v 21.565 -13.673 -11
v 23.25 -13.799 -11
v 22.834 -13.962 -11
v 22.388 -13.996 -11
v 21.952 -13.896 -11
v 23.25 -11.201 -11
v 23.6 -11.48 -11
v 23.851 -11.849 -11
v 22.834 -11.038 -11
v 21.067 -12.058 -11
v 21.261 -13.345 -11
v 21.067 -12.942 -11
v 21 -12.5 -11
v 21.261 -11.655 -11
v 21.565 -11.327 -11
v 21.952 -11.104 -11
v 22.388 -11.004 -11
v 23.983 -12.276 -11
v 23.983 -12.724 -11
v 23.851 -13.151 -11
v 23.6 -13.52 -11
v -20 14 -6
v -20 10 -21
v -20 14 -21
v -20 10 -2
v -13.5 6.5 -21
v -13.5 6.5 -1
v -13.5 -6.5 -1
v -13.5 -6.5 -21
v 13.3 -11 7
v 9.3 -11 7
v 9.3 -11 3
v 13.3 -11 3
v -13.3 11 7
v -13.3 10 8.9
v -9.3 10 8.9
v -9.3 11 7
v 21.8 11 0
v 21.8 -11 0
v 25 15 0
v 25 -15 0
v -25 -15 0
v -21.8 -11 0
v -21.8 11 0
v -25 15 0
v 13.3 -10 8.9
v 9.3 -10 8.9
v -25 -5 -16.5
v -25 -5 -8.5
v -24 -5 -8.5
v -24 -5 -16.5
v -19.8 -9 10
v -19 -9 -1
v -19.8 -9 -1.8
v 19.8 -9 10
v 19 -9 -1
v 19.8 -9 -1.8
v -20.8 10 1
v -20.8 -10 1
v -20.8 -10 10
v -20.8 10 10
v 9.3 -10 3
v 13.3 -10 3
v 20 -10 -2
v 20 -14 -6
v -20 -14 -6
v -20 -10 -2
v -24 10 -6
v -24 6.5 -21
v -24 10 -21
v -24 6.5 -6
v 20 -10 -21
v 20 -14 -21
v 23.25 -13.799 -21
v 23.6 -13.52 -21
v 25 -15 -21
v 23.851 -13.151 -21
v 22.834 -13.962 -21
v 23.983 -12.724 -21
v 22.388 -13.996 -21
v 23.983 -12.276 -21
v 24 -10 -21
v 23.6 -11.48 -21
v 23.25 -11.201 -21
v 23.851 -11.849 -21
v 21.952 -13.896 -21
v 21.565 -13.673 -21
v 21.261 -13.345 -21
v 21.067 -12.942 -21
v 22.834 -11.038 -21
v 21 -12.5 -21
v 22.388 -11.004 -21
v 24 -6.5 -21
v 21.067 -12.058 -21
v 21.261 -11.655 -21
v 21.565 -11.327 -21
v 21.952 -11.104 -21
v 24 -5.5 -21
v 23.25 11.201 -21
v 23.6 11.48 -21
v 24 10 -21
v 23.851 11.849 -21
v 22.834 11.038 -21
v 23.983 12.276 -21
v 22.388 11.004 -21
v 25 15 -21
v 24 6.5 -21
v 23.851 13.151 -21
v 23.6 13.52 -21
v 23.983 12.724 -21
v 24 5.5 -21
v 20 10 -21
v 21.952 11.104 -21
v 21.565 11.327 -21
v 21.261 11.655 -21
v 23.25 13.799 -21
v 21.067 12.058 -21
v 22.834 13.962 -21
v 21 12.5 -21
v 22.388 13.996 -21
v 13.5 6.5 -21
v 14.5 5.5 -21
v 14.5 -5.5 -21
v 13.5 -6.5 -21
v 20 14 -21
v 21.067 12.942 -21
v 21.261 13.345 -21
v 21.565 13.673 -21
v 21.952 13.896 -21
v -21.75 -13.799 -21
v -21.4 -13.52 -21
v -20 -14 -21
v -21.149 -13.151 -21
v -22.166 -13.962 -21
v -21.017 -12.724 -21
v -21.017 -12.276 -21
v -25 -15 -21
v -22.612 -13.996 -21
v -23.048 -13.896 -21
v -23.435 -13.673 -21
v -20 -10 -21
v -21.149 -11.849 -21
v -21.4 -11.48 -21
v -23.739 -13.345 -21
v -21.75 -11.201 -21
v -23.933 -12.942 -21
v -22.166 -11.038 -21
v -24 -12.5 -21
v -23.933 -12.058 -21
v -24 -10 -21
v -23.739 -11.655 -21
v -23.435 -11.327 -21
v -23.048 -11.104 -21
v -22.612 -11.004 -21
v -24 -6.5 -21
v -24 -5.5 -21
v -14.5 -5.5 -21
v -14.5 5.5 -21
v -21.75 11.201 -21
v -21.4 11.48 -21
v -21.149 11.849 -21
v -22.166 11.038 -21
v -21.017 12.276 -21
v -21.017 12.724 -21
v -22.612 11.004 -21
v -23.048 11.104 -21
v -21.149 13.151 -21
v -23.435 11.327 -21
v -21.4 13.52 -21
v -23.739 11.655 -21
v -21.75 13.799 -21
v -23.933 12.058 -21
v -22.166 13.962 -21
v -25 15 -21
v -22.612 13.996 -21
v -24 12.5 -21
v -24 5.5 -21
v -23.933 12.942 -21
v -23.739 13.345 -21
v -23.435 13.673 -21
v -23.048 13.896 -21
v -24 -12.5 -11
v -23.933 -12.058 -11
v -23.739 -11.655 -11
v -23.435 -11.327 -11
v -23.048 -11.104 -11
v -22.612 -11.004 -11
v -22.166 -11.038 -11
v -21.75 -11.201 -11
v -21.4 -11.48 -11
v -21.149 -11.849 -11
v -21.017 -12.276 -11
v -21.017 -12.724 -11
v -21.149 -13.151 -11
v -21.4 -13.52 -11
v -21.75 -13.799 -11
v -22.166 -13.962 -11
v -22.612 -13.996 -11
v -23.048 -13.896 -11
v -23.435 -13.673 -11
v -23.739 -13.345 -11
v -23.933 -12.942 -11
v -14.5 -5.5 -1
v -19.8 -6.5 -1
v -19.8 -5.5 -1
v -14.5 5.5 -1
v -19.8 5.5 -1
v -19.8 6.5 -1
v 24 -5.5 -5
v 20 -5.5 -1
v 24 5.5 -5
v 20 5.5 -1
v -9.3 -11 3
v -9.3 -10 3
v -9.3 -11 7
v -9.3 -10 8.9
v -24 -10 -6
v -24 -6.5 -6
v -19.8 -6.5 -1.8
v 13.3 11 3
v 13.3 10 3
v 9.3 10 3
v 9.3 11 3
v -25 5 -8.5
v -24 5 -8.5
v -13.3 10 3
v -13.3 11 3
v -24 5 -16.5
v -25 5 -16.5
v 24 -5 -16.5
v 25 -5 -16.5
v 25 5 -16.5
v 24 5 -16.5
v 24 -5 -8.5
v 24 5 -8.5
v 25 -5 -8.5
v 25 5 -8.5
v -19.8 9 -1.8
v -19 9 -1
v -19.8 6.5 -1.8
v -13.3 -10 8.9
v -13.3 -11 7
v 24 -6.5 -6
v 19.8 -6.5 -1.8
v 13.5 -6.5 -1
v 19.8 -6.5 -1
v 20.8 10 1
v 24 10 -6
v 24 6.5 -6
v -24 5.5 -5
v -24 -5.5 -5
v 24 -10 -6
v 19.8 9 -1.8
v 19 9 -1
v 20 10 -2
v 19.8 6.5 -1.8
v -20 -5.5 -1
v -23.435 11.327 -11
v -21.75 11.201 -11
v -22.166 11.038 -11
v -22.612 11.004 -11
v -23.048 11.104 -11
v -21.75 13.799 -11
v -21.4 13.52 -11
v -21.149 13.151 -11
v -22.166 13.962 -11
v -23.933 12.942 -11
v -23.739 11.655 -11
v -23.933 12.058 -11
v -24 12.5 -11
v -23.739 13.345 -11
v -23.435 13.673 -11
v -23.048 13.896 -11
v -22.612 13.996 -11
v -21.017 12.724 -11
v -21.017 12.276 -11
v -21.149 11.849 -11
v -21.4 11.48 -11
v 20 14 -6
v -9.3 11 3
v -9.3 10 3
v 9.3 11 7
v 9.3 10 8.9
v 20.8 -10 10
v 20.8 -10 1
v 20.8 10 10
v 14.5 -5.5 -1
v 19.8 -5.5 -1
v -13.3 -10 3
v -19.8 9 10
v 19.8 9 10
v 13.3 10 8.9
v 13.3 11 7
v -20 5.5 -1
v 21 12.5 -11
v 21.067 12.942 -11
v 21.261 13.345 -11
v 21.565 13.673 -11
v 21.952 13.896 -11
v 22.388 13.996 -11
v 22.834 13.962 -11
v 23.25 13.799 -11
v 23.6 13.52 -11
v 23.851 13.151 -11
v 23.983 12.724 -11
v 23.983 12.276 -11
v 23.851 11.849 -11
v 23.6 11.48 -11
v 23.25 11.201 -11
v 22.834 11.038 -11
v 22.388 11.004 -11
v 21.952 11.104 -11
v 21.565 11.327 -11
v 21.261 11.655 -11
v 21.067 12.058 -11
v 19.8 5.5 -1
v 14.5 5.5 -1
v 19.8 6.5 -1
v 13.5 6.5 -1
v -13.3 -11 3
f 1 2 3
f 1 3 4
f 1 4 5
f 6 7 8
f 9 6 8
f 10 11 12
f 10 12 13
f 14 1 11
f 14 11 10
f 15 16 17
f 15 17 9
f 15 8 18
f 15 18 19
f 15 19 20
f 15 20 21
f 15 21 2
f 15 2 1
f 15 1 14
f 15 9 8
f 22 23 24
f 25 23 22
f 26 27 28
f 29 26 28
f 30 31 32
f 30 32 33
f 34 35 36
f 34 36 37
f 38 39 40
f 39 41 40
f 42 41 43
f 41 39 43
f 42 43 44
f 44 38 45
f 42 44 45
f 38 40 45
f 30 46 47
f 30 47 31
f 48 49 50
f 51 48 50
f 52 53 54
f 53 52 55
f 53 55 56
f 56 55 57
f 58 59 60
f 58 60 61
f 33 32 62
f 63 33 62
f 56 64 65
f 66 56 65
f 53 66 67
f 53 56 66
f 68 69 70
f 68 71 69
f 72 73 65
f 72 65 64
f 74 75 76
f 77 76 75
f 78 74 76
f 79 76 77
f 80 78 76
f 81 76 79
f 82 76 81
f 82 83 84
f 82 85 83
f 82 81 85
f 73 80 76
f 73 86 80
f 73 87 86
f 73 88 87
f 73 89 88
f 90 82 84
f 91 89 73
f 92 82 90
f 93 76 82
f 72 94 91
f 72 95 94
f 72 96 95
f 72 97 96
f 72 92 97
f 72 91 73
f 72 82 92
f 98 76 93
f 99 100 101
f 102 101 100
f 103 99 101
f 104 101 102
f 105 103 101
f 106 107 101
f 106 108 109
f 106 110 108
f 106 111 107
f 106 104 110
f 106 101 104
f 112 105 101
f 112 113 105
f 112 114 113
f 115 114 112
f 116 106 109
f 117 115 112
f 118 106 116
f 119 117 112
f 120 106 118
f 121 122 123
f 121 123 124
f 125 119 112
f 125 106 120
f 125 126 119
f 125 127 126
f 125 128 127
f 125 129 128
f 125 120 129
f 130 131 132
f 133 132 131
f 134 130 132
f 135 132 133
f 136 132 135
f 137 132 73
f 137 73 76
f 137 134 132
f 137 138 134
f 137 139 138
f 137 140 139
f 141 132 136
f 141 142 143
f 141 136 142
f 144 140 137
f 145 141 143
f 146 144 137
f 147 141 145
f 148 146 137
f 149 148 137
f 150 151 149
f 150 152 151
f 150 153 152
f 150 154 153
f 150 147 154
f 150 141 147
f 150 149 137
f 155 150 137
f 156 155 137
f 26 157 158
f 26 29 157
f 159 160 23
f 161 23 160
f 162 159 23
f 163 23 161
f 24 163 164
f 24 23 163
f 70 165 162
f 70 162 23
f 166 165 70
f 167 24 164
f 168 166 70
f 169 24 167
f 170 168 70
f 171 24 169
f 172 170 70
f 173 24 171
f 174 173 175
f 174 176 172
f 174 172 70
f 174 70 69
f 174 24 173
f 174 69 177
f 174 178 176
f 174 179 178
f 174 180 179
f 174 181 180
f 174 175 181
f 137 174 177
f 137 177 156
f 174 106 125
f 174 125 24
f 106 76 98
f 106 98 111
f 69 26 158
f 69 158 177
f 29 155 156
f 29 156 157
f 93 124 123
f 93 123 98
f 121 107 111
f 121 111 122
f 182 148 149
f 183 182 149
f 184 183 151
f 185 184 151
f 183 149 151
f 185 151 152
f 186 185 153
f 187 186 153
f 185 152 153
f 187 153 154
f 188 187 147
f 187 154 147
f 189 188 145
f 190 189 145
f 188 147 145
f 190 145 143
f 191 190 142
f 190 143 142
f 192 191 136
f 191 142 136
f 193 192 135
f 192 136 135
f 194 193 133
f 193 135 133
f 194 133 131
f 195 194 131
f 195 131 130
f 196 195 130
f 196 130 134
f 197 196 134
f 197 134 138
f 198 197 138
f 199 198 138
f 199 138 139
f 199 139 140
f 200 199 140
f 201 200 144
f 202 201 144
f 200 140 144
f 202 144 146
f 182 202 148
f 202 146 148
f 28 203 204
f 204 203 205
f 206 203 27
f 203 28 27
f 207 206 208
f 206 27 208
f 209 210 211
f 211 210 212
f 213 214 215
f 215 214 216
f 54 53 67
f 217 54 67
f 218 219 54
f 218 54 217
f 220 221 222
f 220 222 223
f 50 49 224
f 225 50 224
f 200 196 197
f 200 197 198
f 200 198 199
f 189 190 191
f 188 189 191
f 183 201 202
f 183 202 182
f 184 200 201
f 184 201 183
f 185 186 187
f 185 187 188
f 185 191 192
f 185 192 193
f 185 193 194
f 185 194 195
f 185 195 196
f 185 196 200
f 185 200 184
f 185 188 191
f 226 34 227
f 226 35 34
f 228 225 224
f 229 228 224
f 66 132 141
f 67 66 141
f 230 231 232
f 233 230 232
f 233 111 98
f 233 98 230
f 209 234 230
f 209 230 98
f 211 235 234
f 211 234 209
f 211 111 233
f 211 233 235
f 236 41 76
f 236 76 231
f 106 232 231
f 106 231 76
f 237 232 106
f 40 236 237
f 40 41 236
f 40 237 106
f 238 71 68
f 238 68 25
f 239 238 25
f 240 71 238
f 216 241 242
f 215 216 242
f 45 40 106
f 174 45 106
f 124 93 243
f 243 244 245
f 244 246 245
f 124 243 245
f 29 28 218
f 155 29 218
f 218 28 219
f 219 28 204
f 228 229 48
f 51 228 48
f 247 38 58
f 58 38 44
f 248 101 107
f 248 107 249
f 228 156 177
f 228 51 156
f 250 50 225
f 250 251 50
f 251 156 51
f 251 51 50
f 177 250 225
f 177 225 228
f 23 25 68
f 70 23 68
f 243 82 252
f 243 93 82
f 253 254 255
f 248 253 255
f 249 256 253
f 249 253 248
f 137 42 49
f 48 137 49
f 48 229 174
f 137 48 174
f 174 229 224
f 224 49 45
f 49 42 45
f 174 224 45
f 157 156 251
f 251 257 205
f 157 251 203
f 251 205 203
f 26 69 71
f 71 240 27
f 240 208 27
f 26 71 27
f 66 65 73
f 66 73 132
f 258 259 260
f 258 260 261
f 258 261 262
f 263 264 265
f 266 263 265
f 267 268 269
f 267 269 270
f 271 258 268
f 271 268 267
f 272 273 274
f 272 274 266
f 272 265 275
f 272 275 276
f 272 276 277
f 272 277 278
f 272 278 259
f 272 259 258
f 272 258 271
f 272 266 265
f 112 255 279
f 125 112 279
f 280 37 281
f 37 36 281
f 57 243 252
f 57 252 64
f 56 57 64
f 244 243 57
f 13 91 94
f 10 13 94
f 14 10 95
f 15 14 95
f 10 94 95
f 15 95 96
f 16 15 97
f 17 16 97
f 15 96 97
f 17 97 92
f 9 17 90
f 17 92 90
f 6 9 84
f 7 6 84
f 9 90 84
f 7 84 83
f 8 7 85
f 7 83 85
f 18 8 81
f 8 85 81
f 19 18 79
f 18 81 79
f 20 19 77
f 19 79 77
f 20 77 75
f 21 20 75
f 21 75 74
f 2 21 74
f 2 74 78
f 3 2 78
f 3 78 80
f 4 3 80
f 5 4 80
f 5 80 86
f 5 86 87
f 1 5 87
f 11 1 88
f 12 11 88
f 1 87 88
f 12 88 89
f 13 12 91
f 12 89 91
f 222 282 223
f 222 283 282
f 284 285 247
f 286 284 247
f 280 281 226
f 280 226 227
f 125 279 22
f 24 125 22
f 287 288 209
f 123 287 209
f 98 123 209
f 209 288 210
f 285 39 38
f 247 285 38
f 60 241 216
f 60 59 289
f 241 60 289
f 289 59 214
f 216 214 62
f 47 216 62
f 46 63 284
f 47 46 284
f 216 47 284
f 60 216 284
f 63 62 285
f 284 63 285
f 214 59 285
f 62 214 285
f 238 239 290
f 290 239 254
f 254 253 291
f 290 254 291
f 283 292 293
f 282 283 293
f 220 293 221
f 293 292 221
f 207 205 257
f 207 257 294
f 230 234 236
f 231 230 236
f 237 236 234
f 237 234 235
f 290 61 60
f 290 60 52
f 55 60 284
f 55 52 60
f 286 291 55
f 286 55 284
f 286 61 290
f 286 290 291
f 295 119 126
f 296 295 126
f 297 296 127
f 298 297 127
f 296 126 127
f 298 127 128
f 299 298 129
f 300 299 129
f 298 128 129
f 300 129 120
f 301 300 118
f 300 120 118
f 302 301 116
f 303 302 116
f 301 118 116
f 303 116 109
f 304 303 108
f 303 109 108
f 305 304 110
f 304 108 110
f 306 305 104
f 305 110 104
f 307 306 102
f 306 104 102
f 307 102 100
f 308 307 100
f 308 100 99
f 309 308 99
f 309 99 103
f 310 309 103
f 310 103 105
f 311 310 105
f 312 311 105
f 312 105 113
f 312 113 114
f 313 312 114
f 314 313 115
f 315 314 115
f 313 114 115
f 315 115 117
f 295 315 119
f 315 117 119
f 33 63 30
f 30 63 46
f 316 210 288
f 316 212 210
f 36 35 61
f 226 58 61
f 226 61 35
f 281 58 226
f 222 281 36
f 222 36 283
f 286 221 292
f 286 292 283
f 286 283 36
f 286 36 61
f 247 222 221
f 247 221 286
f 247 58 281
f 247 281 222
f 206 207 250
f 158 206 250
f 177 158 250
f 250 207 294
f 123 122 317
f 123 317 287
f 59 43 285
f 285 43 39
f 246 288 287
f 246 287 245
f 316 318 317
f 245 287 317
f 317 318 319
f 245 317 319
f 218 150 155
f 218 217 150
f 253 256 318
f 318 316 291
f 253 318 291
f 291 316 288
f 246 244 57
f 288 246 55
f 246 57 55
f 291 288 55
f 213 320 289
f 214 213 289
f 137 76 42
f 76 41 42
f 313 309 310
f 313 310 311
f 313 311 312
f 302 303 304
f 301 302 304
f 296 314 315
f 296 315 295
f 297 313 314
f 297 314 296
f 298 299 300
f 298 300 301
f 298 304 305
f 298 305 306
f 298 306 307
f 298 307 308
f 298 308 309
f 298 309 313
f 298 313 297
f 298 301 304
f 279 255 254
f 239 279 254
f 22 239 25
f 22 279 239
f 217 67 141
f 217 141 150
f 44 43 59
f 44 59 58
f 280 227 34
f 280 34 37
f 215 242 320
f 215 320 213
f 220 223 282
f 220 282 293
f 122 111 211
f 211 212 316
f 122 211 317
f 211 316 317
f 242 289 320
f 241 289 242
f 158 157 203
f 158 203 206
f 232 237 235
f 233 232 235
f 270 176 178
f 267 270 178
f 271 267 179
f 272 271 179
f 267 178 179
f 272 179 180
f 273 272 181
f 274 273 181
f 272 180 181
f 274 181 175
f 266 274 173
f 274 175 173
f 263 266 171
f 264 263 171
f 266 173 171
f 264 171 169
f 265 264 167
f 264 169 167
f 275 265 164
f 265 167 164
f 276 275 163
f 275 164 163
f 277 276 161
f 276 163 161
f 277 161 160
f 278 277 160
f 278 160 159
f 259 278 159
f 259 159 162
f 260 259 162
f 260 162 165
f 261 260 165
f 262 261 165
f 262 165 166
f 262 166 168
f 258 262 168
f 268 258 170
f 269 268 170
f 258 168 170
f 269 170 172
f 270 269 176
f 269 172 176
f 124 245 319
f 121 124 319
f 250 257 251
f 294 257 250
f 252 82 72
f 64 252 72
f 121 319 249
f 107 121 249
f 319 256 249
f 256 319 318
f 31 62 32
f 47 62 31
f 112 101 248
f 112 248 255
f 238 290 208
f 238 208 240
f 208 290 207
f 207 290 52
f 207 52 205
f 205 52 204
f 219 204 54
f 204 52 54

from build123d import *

# Parameters (mm, degrees)
SKETCH1_W            = 41.6
SKETCH1_H            = 20
SKETCH1_W_2          = 39.6
SKETCH1_H_2          = 18
BOSS_EXTRUDE2_DEPTH  = 10
SKETCH2_W            = 4
SKETCH2_H            = 10
BOSS_EXTRUDE3_DEPTH  = 1
SKETCH3_W            = 3
SKETCH3_H            = 1
CUT_EXTRUDE1_DEPTH   = 27
SKETCH4_W            = 4
SKETCH4_H            = 10
BOSS_EXTRUDE4_DEPTH  = 1
SKETCH5_W            = 3
SKETCH5_H            = 1
CUT_EXTRUDE2_DEPTH   = 27
SKETCH6_W            = 50
SKETCH6_H            = 30
SKETCH6_W_2          = 41.6
SKETCH6_H_2          = 20
SKETCH6_W_3          = 39.6
SKETCH6_H_3          = 18
BOSS_EXTRUDE6_DEPTH  = 1
CHAMFER1_SIZE        = 1
SKETCH7_W            = 50
SKETCH7_H            = 30
SKETCH7_W_2          = 48
SKETCH7_H_2          = 28
BOSS_EXTRUDE7_DEPTH  = 20
SKETCH8_W            = 4.2
SKETCH8_H            = 1
BOSS_EXTRUDE8_DEPTH  = 20
SKETCH9_W            = 4.2
SKETCH9_H            = 1
BOSS_EXTRUDE9_DEPTH  = 20
SKETCH10_W           = 4
SKETCH10_H           = 4
BOSS_EXTRUDE10_DEPTH = 20
SKETCH11_W           = 2
SKETCH11_H           = 10
CUT_EXTRUDE3_DEPTH   = 1
SKETCH12_W           = 2
SKETCH12_H           = 10
CUT_EXTRUDE4_DEPTH   = 1
SKETCH13_R           = 1.5
CUT_EXTRUDE5_DEPTH   = 10
CHAMFER2_SIZE        = 5
CHAMFER3_SIZE        = 5
CHAMFER4_SIZE        = 4
SKETCH17_W           = 20
SKETCH17_H           = 14
CUT_EXTRUDE8_DEPTH   = 10
SKETCH18_W           = 4.2
SKETCH18_H           = 1
BOSS_EXTRUDE11_DEPTH = 20
CHAMFER5_SIZE        = 5
CHAMFER6_SIZE        = 5
CHAMFER7_SIZE        = 4
SKETCH19_W           = 20
SKETCH19_H           = 14
CUT_EXTRUDE9_DEPTH   = 10
SKETCH20_W           = 4.2
SKETCH20_H           = 1
BOSS_EXTRUDE12_DEPTH = 20
CHAMFER8_SIZE        = 4
CHAMFER9_SIZE        = 5


# Some blends are built 0.0001 mm under size
with BuildPart() as part:
    # Sketch1 → Boss-Extrude2 (new body)
    with BuildSketch(Plane.XY):
        Rectangle(SKETCH1_W, SKETCH1_H)
        Rectangle(SKETCH1_W_2, SKETCH1_H_2, mode=Mode.SUBTRACT)
    extrude(amount=BOSS_EXTRUDE2_DEPTH)

    # Sketch2 → Boss-Extrude3 (add)
    with BuildSketch(Plane.XZ.offset(10)):
        with Locations((-11.3, 5)):
            Rectangle(SKETCH2_W, SKETCH2_H)
        with Locations((11.3, 5)):
            Rectangle(SKETCH2_W, SKETCH2_H)
    extrude(amount=BOSS_EXTRUDE3_DEPTH)

    # Sketch3 → Cut-Extrude1 (cut)
    with BuildSketch(Plane.ZY.offset(13.3)):
        Polygon((8.900149248, -10), (7, -11), (10, -11), (10, -10), align=None)
        with Locations((1.5, -10.5)):
            Rectangle(SKETCH3_W, SKETCH3_H)
    extrude(amount=-CUT_EXTRUDE1_DEPTH, mode=Mode.SUBTRACT)

    # Sketch4 → Boss-Extrude4 (add)
    with BuildSketch(Plane(origin=(0, 10, 0), x_dir=(1, 0, 0), z_dir=(0, 1, 0))):
        with Locations((11.3, -5)):
            Rectangle(SKETCH4_W, SKETCH4_H)
        with Locations((-11.3, -5)):
            Rectangle(SKETCH4_W, SKETCH4_H)
    extrude(amount=BOSS_EXTRUDE4_DEPTH)

    # Sketch5 → Cut-Extrude2 (cut)
    with BuildSketch(Plane(origin=(13.3, 0, 0), x_dir=(0, 0, -1), z_dir=(1, 0, 0))):
        Polygon((-7, 11), (-10, 11), (-10, 10), (-8.900149248, 10), align=None)
        with Locations((-1.5, 10.5)):
            Rectangle(SKETCH5_W, SKETCH5_H)
    extrude(amount=-CUT_EXTRUDE2_DEPTH, mode=Mode.SUBTRACT)

    # Sketch6 → Boss-Extrude6 (add)
    # profile 1 of 2: a face of its own
    with BuildSketch(Plane(origin=(0, 0, 0), x_dir=(-1, 0, 0), z_dir=(0, 0, -1))):
        Rectangle(SKETCH6_W, SKETCH6_H)
        Rectangle(SKETCH6_W_2, SKETCH6_H_2, mode=Mode.SUBTRACT)
    # profile 2 of 2: a face of its own
    with BuildSketch(Plane(origin=(0, 0, 0), x_dir=(-1, 0, 0), z_dir=(0, 0, -1))):
        Rectangle(SKETCH6_W_2, SKETCH6_H_2)
        Rectangle(SKETCH6_W_3, SKETCH6_H_3, mode=Mode.SUBTRACT)
    extrude(amount=BOSS_EXTRUDE6_DEPTH)

    # Chamfer1
    chamfer1_edges = [part.edges().sort_by_distance(p)[0] for p in [
        (0, -10, 0),
        (-20.8, 0, 0),
        (0, 10, 0),
        (20.8, 0, 0),
    ]]
    chamfer(chamfer1_edges, length=CHAMFER1_SIZE)

    # Sketch7 → Boss-Extrude7 (add)
    with BuildSketch(Plane(origin=(0, 0, -1), x_dir=(-1, 0, 0), z_dir=(0, 0, -1))):
        Rectangle(SKETCH7_W, SKETCH7_H)
        Rectangle(SKETCH7_W_2, SKETCH7_H_2, mode=Mode.SUBTRACT)
    extrude(amount=BOSS_EXTRUDE7_DEPTH)

    # Sketch8 → Boss-Extrude8 (add)
    with BuildSketch(Plane(origin=(0, 0, -1), x_dir=(-1, 0, 0), z_dir=(0, 0, -1))):
        Polygon((-15, -5), (-19.8, -5), (-19.8, -6), (-14, -6), (-14, 6), (-19.8, 6), (-19.8, 5), (-15, 5), align=None)
        with Locations((-21.9, 5.5)):
            Rectangle(SKETCH8_W, SKETCH8_H)
        with Locations((-21.9, -5.5)):
            Rectangle(SKETCH8_W, SKETCH8_H)
    extrude(amount=BOSS_EXTRUDE8_DEPTH)

    # Sketch9 → Boss-Extrude9 (add)
    with BuildSketch(Plane(origin=(0, 0, -1), x_dir=(-1, 0, 0), z_dir=(0, 0, -1))):
        Polygon((15, 5), (19.8, 5), (19.8, 6), (14, 6), (14, -6), (19.8, -6), (19.8, -5), (15, -5), align=None)
        with Locations((21.9, 5.5)):
            Rectangle(SKETCH9_W, SKETCH9_H)
        with Locations((21.9, -5.5)):
            Rectangle(SKETCH9_W, SKETCH9_H)
    extrude(amount=BOSS_EXTRUDE9_DEPTH)

    # Sketch10 → Boss-Extrude10 (add)
    with BuildSketch(Plane(origin=(0, 0, -1), x_dir=(-1, 0, 0), z_dir=(0, 0, -1))):
        with Locations((-22, 12)):
            Rectangle(SKETCH10_W, SKETCH10_H)
        with Locations((22, 12)):
            Rectangle(SKETCH10_W, SKETCH10_H)
        with Locations((22, -12)):
            Rectangle(SKETCH10_W, SKETCH10_H)
        with Locations((-22, -12)):
            Rectangle(SKETCH10_W, SKETCH10_H)
    extrude(amount=BOSS_EXTRUDE10_DEPTH)

    # Sketch11 → Cut-Extrude3 (cut)
    with BuildSketch(Plane.ZY.offset(25)):
        Polygon((-10.5, -5), (-10.5, 5), (-16.5, 5), (-16.5, 0), (-16.5, -5), align=None)
        with Locations((-9.5, 0)):
            Rectangle(SKETCH11_W, SKETCH11_H)
    extrude(amount=-CUT_EXTRUDE3_DEPTH, mode=Mode.SUBTRACT)

    # Sketch12 → Cut-Extrude4 (cut)
    with BuildSketch(Plane(origin=(25, 0, 0), x_dir=(0, 0, -1), z_dir=(1, 0, 0))):
        with Locations((9.5, 0)):
            Rectangle(SKETCH12_W, SKETCH12_H)
        Polygon((16.5, 5), (10.5, 5), (10.5, -5), (16.5, -5), (16.5, 0), align=None)
    extrude(amount=-CUT_EXTRUDE4_DEPTH, mode=Mode.SUBTRACT)

    # Sketch13 → Cut-Extrude5 (cut)
    with BuildSketch(Plane(origin=(0, 0, -21), x_dir=(-1, 0, 0), z_dir=(0, 0, -1))):
        with Locations((-22.5, 12.5)):
            Circle(SKETCH13_R)
        with Locations((22.5, 12.5)):
            Circle(SKETCH13_R)
        with Locations((22.5, -12.5)):
            Circle(SKETCH13_R)
        with Locations((-22.5, -12.5)):
            Circle(SKETCH13_R)
    extrude(amount=-CUT_EXTRUDE5_DEPTH, mode=Mode.SUBTRACT)

    # Chamfer2
    chamfer2_edges = [part.edges().sort_by_distance(p)[0] for p in [
        (0, -14, -1),
        (0, 14, -1),
    ]]
    chamfer(chamfer2_edges, length=CHAMFER2_SIZE - 0.0001)  # a hair under: the kernel refuses the full size

    # Chamfer3
    # the kernel refuses this chamfer: 5 mm, written as the material it adds along each edge
    with BuildSketch(Plane(origin=(24, -21.85851494, -1), x_dir=(-0.9996219169112968, 0, 0.02749587661058636), z_dir=(0, 1, 0))) as chamfer3_piece_1_section:
        Polygon((CHAMFER3_SIZE * 0.999621916911, -CHAMFER3_SIZE * 0.0274958766106), (-CHAMFER3_SIZE * 0.0274958766106, -CHAMFER3_SIZE * 0.999621916911), (0, 0), align=None)
    chamfer3_piece_1 = extrude(amount=28.71692988, mode=Mode.PRIVATE)
    chamfer3_piece_1 = split(chamfer3_piece_1, bisect_by=Plane(origin=(19.8, -10.000025, -1.99995), z_dir=(1, 0, 0)), keep=Keep.TOP, mode=Mode.PRIVATE)
    chamfer3_piece_1 = split(chamfer3_piece_1, bisect_by=Plane(origin=(19.999975, -5, -1.99995), z_dir=(0, -1, 0)), keep=Keep.TOP, mode=Mode.PRIVATE)
    chamfer3_piece_1 = split(chamfer3_piece_1, bisect_by=Plane(origin=(19.999975, -10.0000375, -1.9999375), z_dir=(0, 0.7071067811865476, -0.7071067811865476)), keep=Keep.TOP, mode=Mode.PRIVATE)
    add(chamfer3_piece_1)
    with BuildSketch(Plane(origin=(24, -21.85851494, -1), x_dir=(-0.9996219169112968, 0, 0.02749587661058636), z_dir=(0, 1, 0))) as chamfer3_piece_2_section:
        Polygon((CHAMFER3_SIZE * 0.999621916911, -CHAMFER3_SIZE * 0.0274958766106), (-CHAMFER3_SIZE * 0.0274958766106, -CHAMFER3_SIZE * 0.999621916911), (0, 0), align=None)
    chamfer3_piece_2 = extrude(amount=28.71692988, mode=Mode.PRIVATE)
    chamfer3_piece_2 = split(chamfer3_piece_2, bisect_by=Plane(origin=(19.599975009, -9, -1.399950019), z_dir=(0, -1, 0)), keep=Keep.TOP, mode=Mode.PRIVATE)
    chamfer3_piece_2 = split(chamfer3_piece_2, bisect_by=Plane(origin=(19.599975009, -9.300037514, -1.299937514), z_dir=(0, 0.7071067811865476, -0.7071067811865476)), keep=Keep.TOP, mode=Mode.PRIVATE)
    add(chamfer3_piece_2)
    with BuildSketch(Plane(origin=(24, -21.85851494, -1), x_dir=(-0.9996219169112968, 0, 0.02749587661058636), z_dir=(0, 1, 0))) as chamfer3_piece_3_section:
        Polygon((CHAMFER3_SIZE * 0.999621916911, -CHAMFER3_SIZE * 0.0274958766106), (-CHAMFER3_SIZE * 0.0274958766106, -CHAMFER3_SIZE * 0.999621916911), (0, 0), align=None)
    chamfer3_piece_3 = extrude(amount=28.71692988, mode=Mode.PRIVATE)
    chamfer3_piece_3 = split(chamfer3_piece_3, bisect_by=Plane(origin=(19.8, 6.42920747, -1.451851852), z_dir=(1, 0, 0)), keep=Keep.TOP, mode=Mode.PRIVATE)
    chamfer3_piece_3 = split(chamfer3_piece_3, bisect_by=Plane(origin=(19.903703704, 5, -1.451851852), z_dir=(0, 1, 0)), keep=Keep.TOP, mode=Mode.PRIVATE)
    add(chamfer3_piece_3)
    with BuildSketch(Plane(origin=(-24, 6.85841494, -1), x_dir=(0.9996219169112968, 0, 0.02749587661058636), z_dir=(0, -1, 0))) as chamfer3_piece_4_section:
        Polygon((CHAMFER3_SIZE * 0.999621916911, -CHAMFER3_SIZE * 0.0274958766106), (-CHAMFER3_SIZE * 0.0274958766106, -CHAMFER3_SIZE * 0.999621916911), (0, 0), align=None)
    chamfer3_piece_4 = extrude(amount=28.71692988, mode=Mode.PRIVATE)
    chamfer3_piece_4 = split(chamfer3_piece_4, bisect_by=Plane(origin=(-19.8, 6.42920747, -1.451851852), z_dir=(-1, 0, 0)), keep=Keep.TOP, mode=Mode.PRIVATE)
    chamfer3_piece_4 = split(chamfer3_piece_4, bisect_by=Plane(origin=(-19.903703704, 5, -1.451851852), z_dir=(0, 1, 0)), keep=Keep.TOP, mode=Mode.PRIVATE)
    add(chamfer3_piece_4)
    with BuildSketch(Plane(origin=(-24, -6, -1), x_dir=(0.9996219169112968, 0, 0.02749587661058636), z_dir=(0, -1, 0))) as chamfer3_piece_5_section:
        Polygon((CHAMFER3_SIZE * 0.999621916911, -CHAMFER3_SIZE * 0.0274958766106), (-CHAMFER3_SIZE * 0.0274958766106, -CHAMFER3_SIZE * 0.999621916911), (0, 0), align=None)
    chamfer3_piece_5 = extrude(amount=15.85851494, mode=Mode.PRIVATE)
    chamfer3_piece_5 = split(chamfer3_piece_5, bisect_by=Plane(origin=(-19.8, -7.5, -1.451851852), z_dir=(-1, 0, 0)), keep=Keep.TOP, mode=Mode.PRIVATE)
    chamfer3_piece_5 = split(chamfer3_piece_5, bisect_by=Plane(origin=(-19.903703704, -8.475975926, -0.475875926), z_dir=(0, 0.7071067811865476, -0.7071067811865476)), keep=Keep.TOP, mode=Mode.PRIVATE)
    add(chamfer3_piece_5)
    with BuildSketch(Plane(origin=(-24, 6.85841494, -1), x_dir=(0.9996219169112968, 0, 0.02749587661058636), z_dir=(0, -1, 0))) as chamfer3_piece_6_section:
        Polygon((CHAMFER3_SIZE * 0.999621916911, -CHAMFER3_SIZE * 0.0274958766106), (-CHAMFER3_SIZE * 0.0274958766106, -CHAMFER3_SIZE * 0.999621916911), (0, 0), align=None)
    chamfer3_piece_6 = extrude(amount=28.71692988, mode=Mode.PRIVATE)
    chamfer3_piece_6 = split(chamfer3_piece_6, bisect_by=Plane(origin=(-19.599975009, -9, -1.399950019), z_dir=(0, -1, 0)), keep=Keep.TOP, mode=Mode.PRIVATE)
    chamfer3_piece_6 = split(chamfer3_piece_6, bisect_by=Plane(origin=(-19.599975009, -9.300037514, -1.299937514), z_dir=(0, 0.7071067811865476, -0.7071067811865476)), keep=Keep.TOP, mode=Mode.PRIVATE)
    add(chamfer3_piece_6)
    with BuildSketch(Plane(origin=(-24, 21.85851494, -1), x_dir=(0.9996219169112968, 0, 0.02749587661058636), z_dir=(0, -1, 0))) as chamfer3_piece_7_section:
        Polygon((CHAMFER3_SIZE * 0.999621916911, -CHAMFER3_SIZE * 0.0274958766106), (-CHAMFER3_SIZE * 0.0274958766106, -CHAMFER3_SIZE * 0.999621916911), (0, 0), align=None)
    chamfer3_piece_7 = extrude(amount=28.71692988, mode=Mode.PRIVATE)
    chamfer3_piece_7 = split(chamfer3_piece_7, bisect_by=Plane(origin=(-19.8, 10.000025, -1.99995), z_dir=(-1, 0, 0)), keep=Keep.TOP, mode=Mode.PRIVATE)
    chamfer3_piece_7 = split(chamfer3_piece_7, bisect_by=Plane(origin=(-19.999975, 15, -1.99995), z_dir=(0, -1, 0)), keep=Keep.TOP, mode=Mode.PRIVATE)
    chamfer3_piece_7 = split(chamfer3_piece_7, bisect_by=Plane(origin=(-19.999975, 5, -1.99995), z_dir=(0, 1, 0)), keep=Keep.TOP, mode=Mode.PRIVATE)
    add(chamfer3_piece_7)
    with BuildSketch(Plane(origin=(-24, 21.85851494, -1), x_dir=(0.9996219169112968, 0, 0.02749587661058636), z_dir=(0, -1, 0))) as chamfer3_piece_8_section:
        Polygon((CHAMFER3_SIZE * 0.999621916911, -CHAMFER3_SIZE * 0.0274958766106), (-CHAMFER3_SIZE * 0.0274958766106, -CHAMFER3_SIZE * 0.999621916911), (0, 0), align=None)
    chamfer3_piece_8 = extrude(amount=28.71692988, mode=Mode.PRIVATE)
    chamfer3_piece_8 = split(chamfer3_piece_8, bisect_by=Plane(origin=(-19.599975009, 9, -1.399950019), z_dir=(0, 1, 0)), keep=Keep.TOP, mode=Mode.PRIVATE)
    chamfer3_piece_8 = split(chamfer3_piece_8, bisect_by=Plane(origin=(-19.599975009, 15, -1.399950019), z_dir=(0, -1, 0)), keep=Keep.TOP, mode=Mode.PRIVATE)
    add(chamfer3_piece_8)
    with BuildSketch(Plane(origin=(-24, 21.85851494, -1), x_dir=(0.9996219169112968, 0, 0.02749587661058636), z_dir=(0, -1, 0))) as chamfer3_piece_9_section:
        Polygon((CHAMFER3_SIZE * 0.999621916911, -CHAMFER3_SIZE * 0.0274958766106), (-CHAMFER3_SIZE * 0.0274958766106, -CHAMFER3_SIZE * 0.999621916911), (0, 0), align=None)
    chamfer3_piece_9 = extrude(amount=28.71692988, mode=Mode.PRIVATE)
    chamfer3_piece_9 = split(chamfer3_piece_9, bisect_by=Plane(origin=(-19.8, -6.42920747, -1.451851852), z_dir=(-1, 0, 0)), keep=Keep.TOP, mode=Mode.PRIVATE)
    chamfer3_piece_9 = split(chamfer3_piece_9, bisect_by=Plane(origin=(-19.903703704, -6, -1.451851852), z_dir=(0, -1, 0)), keep=Keep.TOP, mode=Mode.PRIVATE)
    add(chamfer3_piece_9)
    with BuildSketch(Plane(origin=(24, -6.85841494, -1), x_dir=(-0.9996219169112968, 0, 0.02749587661058636), z_dir=(0, 1, 0))) as chamfer3_piece_10_section:
        Polygon((CHAMFER3_SIZE * 0.999621916911, -CHAMFER3_SIZE * 0.0274958766106), (-CHAMFER3_SIZE * 0.0274958766106, -CHAMFER3_SIZE * 0.999621916911), (0, 0), align=None)
    chamfer3_piece_10 = extrude(amount=28.71692988, mode=Mode.PRIVATE)
    chamfer3_piece_10 = split(chamfer3_piece_10, bisect_by=Plane(origin=(19.8, -6.42920747, -1.451851852), z_dir=(1, 0, 0)), keep=Keep.TOP, mode=Mode.PRIVATE)
    chamfer3_piece_10 = split(chamfer3_piece_10, bisect_by=Plane(origin=(19.903703704, -5, -1.451851852), z_dir=(0, -1, 0)), keep=Keep.TOP, mode=Mode.PRIVATE)
    add(chamfer3_piece_10)
    with BuildSketch(Plane(origin=(24, -6.85841494, -1), x_dir=(-0.9996219169112968, 0, 0.02749587661058636), z_dir=(0, 1, 0))) as chamfer3_piece_11_section:
        Polygon((CHAMFER3_SIZE * 0.999621916911, -CHAMFER3_SIZE * 0.0274958766106), (-CHAMFER3_SIZE * 0.0274958766106, -CHAMFER3_SIZE * 0.999621916911), (0, 0), align=None)
    chamfer3_piece_11 = extrude(amount=28.71692988, mode=Mode.PRIVATE)
    chamfer3_piece_11 = split(chamfer3_piece_11, bisect_by=Plane(origin=(19.8, 7.5, -1.451851852), z_dir=(1, 0, 0)), keep=Keep.TOP, mode=Mode.PRIVATE)
    chamfer3_piece_11 = split(chamfer3_piece_11, bisect_by=Plane(origin=(19.903703704, 15, -1.451851852), z_dir=(0, -1, 0)), keep=Keep.TOP, mode=Mode.PRIVATE)
    chamfer3_piece_11 = split(chamfer3_piece_11, bisect_by=Plane(origin=(19.903703704, 5, -1.451851852), z_dir=(0, 1, 0)), keep=Keep.TOP, mode=Mode.PRIVATE)
    add(chamfer3_piece_11)
    with BuildSketch(Plane(origin=(24, -6.85841494, -1), x_dir=(-0.9996219169112968, 0, 0.02749587661058636), z_dir=(0, 1, 0))) as chamfer3_piece_12_section:
        Polygon((CHAMFER3_SIZE * 0.999621916911, -CHAMFER3_SIZE * 0.0274958766106), (-CHAMFER3_SIZE * 0.0274958766106, -CHAMFER3_SIZE * 0.999621916911), (0, 0), align=None)
    chamfer3_piece_12 = extrude(amount=28.71692988, mode=Mode.PRIVATE)
    chamfer3_piece_12 = split(chamfer3_piece_12, bisect_by=Plane(origin=(19.599975009, 9, -1.399950019), z_dir=(0, 1, 0)), keep=Keep.TOP, mode=Mode.PRIVATE)
    chamfer3_piece_12 = split(chamfer3_piece_12, bisect_by=Plane(origin=(19.599975009, 15, -1.399950019), z_dir=(0, -1, 0)), keep=Keep.TOP, mode=Mode.PRIVATE)
    add(chamfer3_piece_12)

    # Chamfer4
    chamfer4_edges = [part.edges().sort_by_distance(p)[0] for p in [
        (24, 0, -1),
        (-24, 0, -1),
    ]]
    chamfer(chamfer4_edges, length=CHAMFER4_SIZE)

    # Sketch17 → Cut-Extrude8 (cut)
    with BuildSketch(Plane.ZY.offset(-14)):
        with Locations((-11, 0)):
            Rectangle(SKETCH17_W, SKETCH17_H)
    extrude(amount=-CUT_EXTRUDE8_DEPTH, mode=Mode.SUBTRACT)

    # Sketch18 → Boss-Extrude11 (add)
    with BuildSketch(Plane(origin=(0, 0, -1), x_dir=(-1, 0, 0), z_dir=(0, 0, -1))):
        Polygon((-19.8, 6.5), (-19.8, 5.5), (-14.5, 5.5), (-14.5, -5.5), (-19.8, -5.5), (-19.8, -6.5), (-13.5, -6.5), (-13.5, 6.5), align=None)
        with Locations((-21.9, 6)):
            Rectangle(SKETCH18_W, SKETCH18_H)
        with Locations((-21.9, -6)):
            Rectangle(SKETCH18_W, SKETCH18_H)
    extrude(amount=BOSS_EXTRUDE11_DEPTH)

    # Chamfer5
    # the kernel refuses this chamfer: 5 mm, written as the material it adds along each edge
    with BuildSketch(Plane(origin=(24, 19.85841494, -1), x_dir=(-0.9996219169112968, 0, 0.02749587661058636), z_dir=(0, -1, 0))) as chamfer5_piece_1_section:
        Polygon((CHAMFER5_SIZE * 0.999621916911, CHAMFER5_SIZE * 0.0274958766106), (-CHAMFER5_SIZE * 0.0274958766106, CHAMFER5_SIZE * 0.999621916911), (0, 0), align=None)
    chamfer5_piece_1 = extrude(amount=13.35841494, mode=Mode.PRIVATE)
    chamfer5_piece_1 = split(chamfer5_piece_1, bisect_by=Plane(origin=(19.8, 10.000025, -1.99995), z_dir=(1, 0, 0)), keep=Keep.TOP, mode=Mode.PRIVATE)
    chamfer5_piece_1 = split(chamfer5_piece_1, bisect_by=Plane(origin=(19.999975, 15, -1.99995), z_dir=(0, -1, 0)), keep=Keep.TOP, mode=Mode.PRIVATE)
    add(chamfer5_piece_1)

    # Chamfer6
    # the kernel refuses this chamfer: 5 mm, written as the material it adds along each edge
    with BuildSketch(Plane(origin=(24, 6.35841494, -1), x_dir=(0.027495876610586317, 0, -0.9996219169112968), z_dir=(0, -1, 0))) as chamfer6_piece_1_section:
        Polygon((CHAMFER6_SIZE * 0.999621916911, -CHAMFER6_SIZE * 0.0274958766106), (-CHAMFER6_SIZE * 0.0274958766106, -CHAMFER6_SIZE * 0.999621916911), (0, 0), align=None)
    chamfer6_piece_1 = extrude(amount=26.21682988, mode=Mode.PRIVATE)
    chamfer6_piece_1 = split(chamfer6_piece_1, bisect_by=Plane(origin=(19.8, -6.75, -2.722222222), z_dir=(1, 0, 0)), keep=Keep.TOP, mode=Mode.PRIVATE)
    chamfer6_piece_1 = split(chamfer6_piece_1, bisect_by=Plane(origin=(22.444444444, -15, -2.722222222), z_dir=(0, 1, 0)), keep=Keep.TOP, mode=Mode.PRIVATE)
    chamfer6_piece_1 = split(chamfer6_piece_1, bisect_by=Plane(origin=(22.444444444, -5.5, -2.722222222), z_dir=(0, -1, 0)), keep=Keep.TOP, mode=Mode.PRIVATE)
    add(chamfer6_piece_1)

    # Chamfer7
    chamfer7_edges = [part.edges().sort_by_distance(p)[0] for p in [
        (24, 0, -1),
    ]]
    chamfer(chamfer7_edges, length=CHAMFER7_SIZE)

    # Sketch19 → Cut-Extrude9 (cut)
    with BuildSketch(Plane(origin=(-14, 0, 0), x_dir=(0, 0, -1), z_dir=(1, 0, 0))):
        with Locations((11, 0)):
            Rectangle(SKETCH19_W, SKETCH19_H)
    extrude(amount=-CUT_EXTRUDE9_DEPTH, mode=Mode.SUBTRACT)

    # Sketch20 → Boss-Extrude12 (add)
    with BuildSketch(Plane(origin=(0, 0, -1), x_dir=(-1, 0, 0), z_dir=(0, 0, -1))):
        Polygon((14.5, 5.5), (19.8, 5.5), (19.8, 6.5), (13.5, 6.5), (13.5, -6.5), (19.8, -6.5), (19.8, -5.5), (14.5, -5.5), align=None)
        with Locations((21.9, 6)):
            Rectangle(SKETCH20_W, SKETCH20_H)
        with Locations((21.9, -6)):
            Rectangle(SKETCH20_W, SKETCH20_H)
    extrude(amount=BOSS_EXTRUDE12_DEPTH)

    # Chamfer8
    chamfer8_edges = [part.edges().sort_by_distance(p)[0] for p in [
        (-24, 0, -1),
    ]]
    chamfer(chamfer8_edges, length=CHAMFER8_SIZE)

    # Chamfer9
    # the kernel refuses this chamfer: 5 mm, written as the material it adds along each edge
    with BuildSketch(Plane(origin=(-24, -19.85841494, -1), x_dir=(-0.027495876610586317, 0, -0.9996219169112968), z_dir=(0, 1, 0))) as chamfer9_piece_1_section:
        Polygon((CHAMFER9_SIZE * 0.999621916911, -CHAMFER9_SIZE * 0.0274958766106), (-CHAMFER9_SIZE * 0.0274958766106, -CHAMFER9_SIZE * 0.999621916911), (0, 0), align=None)
    chamfer9_piece_1 = extrude(amount=13.35841494, mode=Mode.PRIVATE)
    chamfer9_piece_1 = split(chamfer9_piece_1, bisect_by=Plane(origin=(-19.8, -10.000025, -1.99995), z_dir=(-1, 0, 0)), keep=Keep.TOP, mode=Mode.PRIVATE)
    chamfer9_piece_1 = split(chamfer9_piece_1, bisect_by=Plane(origin=(-19.999975, -10.0000375, -1.9999375), z_dir=(0, 0.7071067811865476, -0.7071067811865476)), keep=Keep.TOP, mode=Mode.PRIVATE)
    add(chamfer9_piece_1)
    with BuildSketch(Plane(origin=(-24, 6.5, -1), x_dir=(-0.027495876610586317, 0, -0.9996219169112968), z_dir=(0, 1, 0))) as chamfer9_piece_2_section:
        Polygon((CHAMFER9_SIZE * 0.999621916911, -CHAMFER9_SIZE * 0.0274958766106), (-CHAMFER9_SIZE * 0.0274958766106, -CHAMFER9_SIZE * 0.999621916911), (0, 0), align=None)
    chamfer9_piece_2 = extrude(amount=13.35841494, mode=Mode.PRIVATE)
    chamfer9_piece_2 = split(chamfer9_piece_2, bisect_by=Plane(origin=(-19.8, 6.75, -3.5), z_dir=(-1, 0, 0)), keep=Keep.TOP, mode=Mode.PRIVATE)
    chamfer9_piece_2 = split(chamfer9_piece_2, bisect_by=Plane(origin=(-22, 9.12505, -1.12495), z_dir=(0, -0.7071067811865476, -0.7071067811865476)), keep=Keep.TOP, mode=Mode.PRIVATE)
    add(chamfer9_piece_2)


solid = part.part
